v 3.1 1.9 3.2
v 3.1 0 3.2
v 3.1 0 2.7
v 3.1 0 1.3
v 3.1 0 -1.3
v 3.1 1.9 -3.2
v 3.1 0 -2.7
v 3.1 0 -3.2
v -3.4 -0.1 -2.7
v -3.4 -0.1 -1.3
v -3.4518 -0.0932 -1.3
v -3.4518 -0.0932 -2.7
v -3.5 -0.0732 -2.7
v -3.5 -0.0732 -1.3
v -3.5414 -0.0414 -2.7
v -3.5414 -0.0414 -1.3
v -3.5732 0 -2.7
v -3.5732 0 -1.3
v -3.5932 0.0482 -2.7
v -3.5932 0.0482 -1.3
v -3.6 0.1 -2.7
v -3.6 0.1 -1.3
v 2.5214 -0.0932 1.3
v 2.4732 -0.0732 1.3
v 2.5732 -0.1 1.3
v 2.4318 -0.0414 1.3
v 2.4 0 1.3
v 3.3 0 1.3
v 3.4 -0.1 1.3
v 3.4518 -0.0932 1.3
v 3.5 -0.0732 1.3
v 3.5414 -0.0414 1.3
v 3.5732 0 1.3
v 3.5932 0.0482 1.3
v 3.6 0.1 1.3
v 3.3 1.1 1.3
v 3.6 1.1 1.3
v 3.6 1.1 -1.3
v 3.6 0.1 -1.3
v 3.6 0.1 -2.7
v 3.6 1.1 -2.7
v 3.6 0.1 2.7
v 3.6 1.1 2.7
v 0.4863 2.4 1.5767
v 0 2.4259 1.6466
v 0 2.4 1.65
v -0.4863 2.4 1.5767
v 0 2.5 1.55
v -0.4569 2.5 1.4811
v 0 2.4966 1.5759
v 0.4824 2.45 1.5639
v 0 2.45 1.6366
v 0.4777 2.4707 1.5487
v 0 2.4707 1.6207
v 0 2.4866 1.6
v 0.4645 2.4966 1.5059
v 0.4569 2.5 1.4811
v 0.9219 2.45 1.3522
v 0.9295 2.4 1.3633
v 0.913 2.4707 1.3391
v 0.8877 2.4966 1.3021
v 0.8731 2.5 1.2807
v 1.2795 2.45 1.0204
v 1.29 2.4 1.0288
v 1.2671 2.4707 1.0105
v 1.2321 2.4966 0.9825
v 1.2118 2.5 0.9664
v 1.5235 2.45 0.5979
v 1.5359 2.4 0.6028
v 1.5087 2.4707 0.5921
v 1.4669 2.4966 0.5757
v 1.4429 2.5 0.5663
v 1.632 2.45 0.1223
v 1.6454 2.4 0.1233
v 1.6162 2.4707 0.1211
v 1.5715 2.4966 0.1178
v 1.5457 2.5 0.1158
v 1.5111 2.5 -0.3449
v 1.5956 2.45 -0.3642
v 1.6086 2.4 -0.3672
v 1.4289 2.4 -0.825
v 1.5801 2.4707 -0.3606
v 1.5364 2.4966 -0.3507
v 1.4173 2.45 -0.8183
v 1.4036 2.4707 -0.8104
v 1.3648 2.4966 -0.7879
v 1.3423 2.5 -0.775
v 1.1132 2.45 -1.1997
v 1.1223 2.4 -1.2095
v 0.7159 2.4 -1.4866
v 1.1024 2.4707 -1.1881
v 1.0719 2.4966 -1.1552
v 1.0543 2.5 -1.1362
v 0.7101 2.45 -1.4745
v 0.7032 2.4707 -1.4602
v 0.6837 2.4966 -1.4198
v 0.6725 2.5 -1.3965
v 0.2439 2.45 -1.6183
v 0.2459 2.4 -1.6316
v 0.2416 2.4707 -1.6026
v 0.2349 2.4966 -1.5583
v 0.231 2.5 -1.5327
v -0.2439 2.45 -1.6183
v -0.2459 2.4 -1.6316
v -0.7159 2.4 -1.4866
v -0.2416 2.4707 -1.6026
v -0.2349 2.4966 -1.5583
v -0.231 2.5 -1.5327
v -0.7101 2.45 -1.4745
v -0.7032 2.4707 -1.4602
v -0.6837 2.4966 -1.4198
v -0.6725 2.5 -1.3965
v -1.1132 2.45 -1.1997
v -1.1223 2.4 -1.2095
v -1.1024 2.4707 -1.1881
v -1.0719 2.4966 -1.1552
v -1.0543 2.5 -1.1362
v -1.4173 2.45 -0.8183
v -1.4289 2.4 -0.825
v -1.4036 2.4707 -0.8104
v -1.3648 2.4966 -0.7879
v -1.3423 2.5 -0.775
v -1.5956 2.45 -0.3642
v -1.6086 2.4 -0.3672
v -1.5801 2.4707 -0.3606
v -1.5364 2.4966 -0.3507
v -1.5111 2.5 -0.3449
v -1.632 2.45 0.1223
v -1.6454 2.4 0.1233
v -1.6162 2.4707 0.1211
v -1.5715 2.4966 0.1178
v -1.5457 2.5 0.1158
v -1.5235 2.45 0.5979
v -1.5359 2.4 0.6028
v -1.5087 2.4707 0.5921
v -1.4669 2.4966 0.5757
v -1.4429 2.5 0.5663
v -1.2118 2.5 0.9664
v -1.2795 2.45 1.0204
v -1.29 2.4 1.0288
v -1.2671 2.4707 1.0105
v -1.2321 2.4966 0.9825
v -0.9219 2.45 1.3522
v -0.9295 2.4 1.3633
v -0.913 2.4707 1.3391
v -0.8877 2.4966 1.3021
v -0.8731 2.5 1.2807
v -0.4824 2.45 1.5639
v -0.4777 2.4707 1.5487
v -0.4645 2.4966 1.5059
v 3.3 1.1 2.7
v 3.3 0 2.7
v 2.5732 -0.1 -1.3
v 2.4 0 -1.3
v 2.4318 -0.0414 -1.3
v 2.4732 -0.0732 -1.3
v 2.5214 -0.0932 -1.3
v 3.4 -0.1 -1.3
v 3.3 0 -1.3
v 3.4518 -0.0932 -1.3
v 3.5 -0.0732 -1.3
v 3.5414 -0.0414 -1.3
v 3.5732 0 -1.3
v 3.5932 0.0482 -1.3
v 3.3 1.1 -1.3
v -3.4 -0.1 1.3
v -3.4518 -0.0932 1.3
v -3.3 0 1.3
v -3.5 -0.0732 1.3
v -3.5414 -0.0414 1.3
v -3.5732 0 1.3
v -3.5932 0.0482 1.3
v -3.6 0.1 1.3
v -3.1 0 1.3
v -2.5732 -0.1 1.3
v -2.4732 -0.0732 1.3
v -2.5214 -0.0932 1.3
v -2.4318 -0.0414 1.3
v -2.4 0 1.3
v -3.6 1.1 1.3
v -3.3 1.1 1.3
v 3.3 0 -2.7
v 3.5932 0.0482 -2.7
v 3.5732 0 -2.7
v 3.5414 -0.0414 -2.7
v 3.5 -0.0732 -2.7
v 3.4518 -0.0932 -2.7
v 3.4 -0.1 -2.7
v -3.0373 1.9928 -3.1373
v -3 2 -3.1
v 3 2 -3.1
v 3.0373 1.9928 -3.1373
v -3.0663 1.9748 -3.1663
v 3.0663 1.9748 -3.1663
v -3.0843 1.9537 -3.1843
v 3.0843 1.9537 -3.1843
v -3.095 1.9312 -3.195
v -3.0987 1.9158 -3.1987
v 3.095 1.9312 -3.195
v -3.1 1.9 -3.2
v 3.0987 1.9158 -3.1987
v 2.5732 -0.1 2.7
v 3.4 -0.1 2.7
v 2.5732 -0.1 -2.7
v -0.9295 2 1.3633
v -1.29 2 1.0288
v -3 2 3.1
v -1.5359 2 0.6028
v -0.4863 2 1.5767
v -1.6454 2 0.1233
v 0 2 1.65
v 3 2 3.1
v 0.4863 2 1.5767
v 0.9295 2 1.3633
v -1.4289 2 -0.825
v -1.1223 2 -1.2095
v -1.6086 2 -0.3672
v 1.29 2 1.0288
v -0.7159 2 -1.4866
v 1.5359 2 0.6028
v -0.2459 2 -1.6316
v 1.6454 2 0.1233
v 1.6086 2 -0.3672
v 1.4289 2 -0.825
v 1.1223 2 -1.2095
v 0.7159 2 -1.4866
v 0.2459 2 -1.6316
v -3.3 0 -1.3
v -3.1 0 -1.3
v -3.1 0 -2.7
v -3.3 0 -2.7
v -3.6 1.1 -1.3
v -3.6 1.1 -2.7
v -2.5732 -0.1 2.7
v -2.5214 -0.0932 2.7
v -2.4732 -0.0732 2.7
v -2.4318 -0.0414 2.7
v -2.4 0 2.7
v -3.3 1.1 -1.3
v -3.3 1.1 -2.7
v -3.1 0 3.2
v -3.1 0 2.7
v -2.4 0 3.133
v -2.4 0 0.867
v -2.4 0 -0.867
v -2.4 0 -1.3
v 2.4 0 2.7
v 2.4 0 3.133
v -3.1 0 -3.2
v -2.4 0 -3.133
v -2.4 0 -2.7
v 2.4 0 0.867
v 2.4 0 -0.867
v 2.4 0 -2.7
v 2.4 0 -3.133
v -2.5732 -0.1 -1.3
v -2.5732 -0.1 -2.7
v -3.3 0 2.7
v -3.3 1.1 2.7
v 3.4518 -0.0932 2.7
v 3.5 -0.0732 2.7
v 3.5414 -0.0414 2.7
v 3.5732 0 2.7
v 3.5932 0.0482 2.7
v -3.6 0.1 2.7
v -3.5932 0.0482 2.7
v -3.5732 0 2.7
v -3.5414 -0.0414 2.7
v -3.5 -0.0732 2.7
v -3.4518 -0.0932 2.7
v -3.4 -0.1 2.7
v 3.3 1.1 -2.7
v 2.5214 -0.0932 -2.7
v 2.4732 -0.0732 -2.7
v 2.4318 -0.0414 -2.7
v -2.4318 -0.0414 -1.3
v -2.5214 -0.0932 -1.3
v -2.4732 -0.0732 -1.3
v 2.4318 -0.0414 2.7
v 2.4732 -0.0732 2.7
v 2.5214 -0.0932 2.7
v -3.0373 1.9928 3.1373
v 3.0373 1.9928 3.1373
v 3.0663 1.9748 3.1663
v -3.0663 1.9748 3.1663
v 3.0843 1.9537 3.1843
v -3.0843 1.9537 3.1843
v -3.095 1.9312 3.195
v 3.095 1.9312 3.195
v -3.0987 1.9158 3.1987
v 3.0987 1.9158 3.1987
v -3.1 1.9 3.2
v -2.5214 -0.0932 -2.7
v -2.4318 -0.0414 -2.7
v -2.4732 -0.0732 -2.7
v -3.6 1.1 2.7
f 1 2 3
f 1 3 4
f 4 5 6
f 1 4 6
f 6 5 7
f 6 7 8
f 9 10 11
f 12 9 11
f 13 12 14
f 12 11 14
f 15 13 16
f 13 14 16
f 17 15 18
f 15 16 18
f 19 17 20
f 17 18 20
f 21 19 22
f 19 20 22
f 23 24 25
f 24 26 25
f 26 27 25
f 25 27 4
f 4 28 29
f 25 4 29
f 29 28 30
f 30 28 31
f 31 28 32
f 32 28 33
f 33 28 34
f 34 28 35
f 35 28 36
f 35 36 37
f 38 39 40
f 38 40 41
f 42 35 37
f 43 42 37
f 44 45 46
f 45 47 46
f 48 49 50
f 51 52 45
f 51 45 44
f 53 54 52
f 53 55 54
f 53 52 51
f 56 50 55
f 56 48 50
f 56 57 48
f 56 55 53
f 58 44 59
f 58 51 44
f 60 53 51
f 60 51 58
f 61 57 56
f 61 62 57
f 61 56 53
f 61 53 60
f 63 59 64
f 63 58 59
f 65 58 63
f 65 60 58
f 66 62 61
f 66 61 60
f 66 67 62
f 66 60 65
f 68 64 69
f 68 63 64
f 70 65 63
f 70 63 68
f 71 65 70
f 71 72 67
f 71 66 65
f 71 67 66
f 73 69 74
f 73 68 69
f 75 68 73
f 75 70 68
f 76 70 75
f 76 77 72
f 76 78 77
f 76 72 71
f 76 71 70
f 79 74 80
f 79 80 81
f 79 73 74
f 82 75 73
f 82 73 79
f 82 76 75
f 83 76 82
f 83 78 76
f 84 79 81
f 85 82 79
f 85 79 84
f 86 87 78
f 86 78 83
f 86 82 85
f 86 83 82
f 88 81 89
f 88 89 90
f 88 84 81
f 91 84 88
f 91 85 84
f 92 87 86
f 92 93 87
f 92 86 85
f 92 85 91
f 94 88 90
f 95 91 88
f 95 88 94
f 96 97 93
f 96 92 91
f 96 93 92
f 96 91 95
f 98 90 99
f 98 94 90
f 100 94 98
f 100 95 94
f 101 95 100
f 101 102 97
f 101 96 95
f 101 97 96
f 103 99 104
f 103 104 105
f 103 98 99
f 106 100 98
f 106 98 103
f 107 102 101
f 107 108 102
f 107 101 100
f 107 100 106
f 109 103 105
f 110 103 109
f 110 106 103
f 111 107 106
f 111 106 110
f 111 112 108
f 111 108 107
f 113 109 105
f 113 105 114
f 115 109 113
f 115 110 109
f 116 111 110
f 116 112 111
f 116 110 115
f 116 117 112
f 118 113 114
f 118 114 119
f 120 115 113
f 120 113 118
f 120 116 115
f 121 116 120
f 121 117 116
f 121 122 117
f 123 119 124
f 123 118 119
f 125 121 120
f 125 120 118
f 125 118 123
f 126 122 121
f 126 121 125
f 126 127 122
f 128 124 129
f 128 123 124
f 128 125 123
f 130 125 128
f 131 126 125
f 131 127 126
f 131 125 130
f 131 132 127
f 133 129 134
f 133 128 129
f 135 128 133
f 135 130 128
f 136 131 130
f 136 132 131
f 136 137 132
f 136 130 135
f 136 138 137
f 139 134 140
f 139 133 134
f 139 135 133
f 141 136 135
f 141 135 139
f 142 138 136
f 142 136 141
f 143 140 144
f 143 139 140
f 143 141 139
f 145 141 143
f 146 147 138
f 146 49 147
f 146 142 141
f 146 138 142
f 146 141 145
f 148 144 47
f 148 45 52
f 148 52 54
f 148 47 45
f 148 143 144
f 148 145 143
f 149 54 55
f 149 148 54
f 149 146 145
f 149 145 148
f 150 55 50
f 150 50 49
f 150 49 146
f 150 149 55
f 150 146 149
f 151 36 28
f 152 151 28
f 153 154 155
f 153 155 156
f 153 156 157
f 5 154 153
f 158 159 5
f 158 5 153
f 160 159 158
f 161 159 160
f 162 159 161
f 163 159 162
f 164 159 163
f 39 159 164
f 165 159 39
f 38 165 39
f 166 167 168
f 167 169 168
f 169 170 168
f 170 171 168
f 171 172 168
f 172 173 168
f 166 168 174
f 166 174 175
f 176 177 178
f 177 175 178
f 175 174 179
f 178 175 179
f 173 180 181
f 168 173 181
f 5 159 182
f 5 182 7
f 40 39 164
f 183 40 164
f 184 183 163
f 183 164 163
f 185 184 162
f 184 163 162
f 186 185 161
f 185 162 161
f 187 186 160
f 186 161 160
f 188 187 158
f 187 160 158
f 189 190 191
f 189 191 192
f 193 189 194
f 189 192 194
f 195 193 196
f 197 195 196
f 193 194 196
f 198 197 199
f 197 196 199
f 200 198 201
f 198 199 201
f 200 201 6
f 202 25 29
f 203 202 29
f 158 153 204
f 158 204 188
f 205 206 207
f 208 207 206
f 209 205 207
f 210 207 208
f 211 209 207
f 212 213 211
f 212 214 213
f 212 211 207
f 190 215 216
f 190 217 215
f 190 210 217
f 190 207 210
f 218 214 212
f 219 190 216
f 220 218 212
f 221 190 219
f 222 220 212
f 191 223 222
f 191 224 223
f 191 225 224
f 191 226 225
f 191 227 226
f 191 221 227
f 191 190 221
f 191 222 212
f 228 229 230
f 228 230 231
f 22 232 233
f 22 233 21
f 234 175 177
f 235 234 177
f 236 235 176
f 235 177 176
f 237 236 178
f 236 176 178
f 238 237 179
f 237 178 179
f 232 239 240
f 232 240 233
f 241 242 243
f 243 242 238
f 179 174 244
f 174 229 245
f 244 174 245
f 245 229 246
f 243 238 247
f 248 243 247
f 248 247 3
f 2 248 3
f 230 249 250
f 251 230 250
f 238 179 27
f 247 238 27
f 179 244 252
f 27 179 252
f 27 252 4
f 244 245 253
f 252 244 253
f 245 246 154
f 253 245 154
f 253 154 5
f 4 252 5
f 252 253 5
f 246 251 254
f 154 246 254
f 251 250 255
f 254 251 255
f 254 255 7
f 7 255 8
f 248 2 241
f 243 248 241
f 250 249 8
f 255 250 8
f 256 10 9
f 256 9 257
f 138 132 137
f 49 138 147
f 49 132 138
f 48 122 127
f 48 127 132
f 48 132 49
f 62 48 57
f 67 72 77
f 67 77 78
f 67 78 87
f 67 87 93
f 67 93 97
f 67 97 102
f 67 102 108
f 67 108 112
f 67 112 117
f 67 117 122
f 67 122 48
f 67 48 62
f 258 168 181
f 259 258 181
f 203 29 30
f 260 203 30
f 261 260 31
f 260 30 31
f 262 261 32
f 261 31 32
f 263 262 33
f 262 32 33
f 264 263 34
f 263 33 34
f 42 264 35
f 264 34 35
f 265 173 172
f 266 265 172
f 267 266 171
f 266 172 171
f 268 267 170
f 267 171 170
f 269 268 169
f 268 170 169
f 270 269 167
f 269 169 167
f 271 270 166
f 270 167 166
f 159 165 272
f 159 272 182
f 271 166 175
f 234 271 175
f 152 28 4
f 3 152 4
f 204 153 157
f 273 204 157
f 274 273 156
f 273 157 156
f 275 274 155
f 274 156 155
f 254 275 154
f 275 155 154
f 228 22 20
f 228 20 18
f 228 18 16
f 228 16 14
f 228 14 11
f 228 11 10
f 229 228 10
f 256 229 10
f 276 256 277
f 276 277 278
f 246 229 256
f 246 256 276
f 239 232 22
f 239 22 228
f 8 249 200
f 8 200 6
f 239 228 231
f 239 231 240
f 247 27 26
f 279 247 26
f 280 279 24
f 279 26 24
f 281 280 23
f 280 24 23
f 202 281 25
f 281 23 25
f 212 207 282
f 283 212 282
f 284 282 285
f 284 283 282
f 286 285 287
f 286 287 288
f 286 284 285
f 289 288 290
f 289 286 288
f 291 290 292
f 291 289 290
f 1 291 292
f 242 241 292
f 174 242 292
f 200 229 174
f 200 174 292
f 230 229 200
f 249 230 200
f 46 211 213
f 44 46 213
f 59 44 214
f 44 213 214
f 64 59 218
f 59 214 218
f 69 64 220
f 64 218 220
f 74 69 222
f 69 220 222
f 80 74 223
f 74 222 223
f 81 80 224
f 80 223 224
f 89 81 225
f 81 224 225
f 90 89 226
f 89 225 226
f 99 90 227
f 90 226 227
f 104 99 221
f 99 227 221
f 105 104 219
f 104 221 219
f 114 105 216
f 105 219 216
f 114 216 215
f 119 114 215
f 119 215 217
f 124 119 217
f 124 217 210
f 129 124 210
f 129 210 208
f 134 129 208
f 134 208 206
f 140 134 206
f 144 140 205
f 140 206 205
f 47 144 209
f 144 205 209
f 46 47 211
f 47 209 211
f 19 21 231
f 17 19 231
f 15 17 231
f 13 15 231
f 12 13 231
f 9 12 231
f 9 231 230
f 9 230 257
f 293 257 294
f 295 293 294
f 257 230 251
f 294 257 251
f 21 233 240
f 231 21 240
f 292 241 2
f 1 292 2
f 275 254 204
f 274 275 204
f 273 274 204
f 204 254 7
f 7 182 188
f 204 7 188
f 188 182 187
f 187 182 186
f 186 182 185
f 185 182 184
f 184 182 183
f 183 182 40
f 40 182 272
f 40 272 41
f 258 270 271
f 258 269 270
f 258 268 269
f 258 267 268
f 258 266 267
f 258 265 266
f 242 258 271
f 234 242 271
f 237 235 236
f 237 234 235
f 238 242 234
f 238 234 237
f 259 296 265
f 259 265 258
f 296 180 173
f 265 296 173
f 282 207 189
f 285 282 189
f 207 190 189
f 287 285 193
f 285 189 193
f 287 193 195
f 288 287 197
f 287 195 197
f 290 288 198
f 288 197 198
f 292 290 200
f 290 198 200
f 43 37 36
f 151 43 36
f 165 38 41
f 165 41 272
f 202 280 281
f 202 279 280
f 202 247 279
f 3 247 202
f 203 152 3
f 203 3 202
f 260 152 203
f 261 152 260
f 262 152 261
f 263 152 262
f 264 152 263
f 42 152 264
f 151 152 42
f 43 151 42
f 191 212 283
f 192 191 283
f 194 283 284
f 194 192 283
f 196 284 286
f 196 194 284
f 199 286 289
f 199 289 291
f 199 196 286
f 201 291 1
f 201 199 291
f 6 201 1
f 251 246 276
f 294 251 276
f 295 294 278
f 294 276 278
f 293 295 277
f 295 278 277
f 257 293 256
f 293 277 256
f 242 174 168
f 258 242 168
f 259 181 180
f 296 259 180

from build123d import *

# Parameters (mm, degrees)
ESQUISSE1_W           = 6.2
ESQUISSE1_H           = 6.4
BOSS_EXTRU_1_DEPTH    = 2
ESQUISSE2_R           = 1.65
BOSS_EXTRU_2_DEPTH    = 0.5
BOSS_EXTRU_4_START    = 1.3
BOSS_EXTRU_4_DEPTH    = 1.4
CONG_2_R              = 0.2
CONG_2_OF_SYM_TRIE2_R = 0.2
CONG_3_R              = 0.1
CONG_4_R              = 0.1


with BuildPart() as part:
    # Esquisse1 → Boss.-Extru.1 (new body)
    with BuildSketch(Plane(origin=(0, 0, 0), x_dir=(1, 0, 0), z_dir=(0, 1, 0))):
        Rectangle(ESQUISSE1_W, ESQUISSE1_H)
    extrude(amount=BOSS_EXTRU_1_DEPTH)

    # Esquisse2 → Boss.-Extru.2 (add)
    with BuildSketch(Plane(origin=(0, 2, 0), x_dir=(1, 0, 0), z_dir=(0, 1, 0))):
        with Locations(Location((0, 0, 0), (0, 0, 270))):
            Circle(ESQUISSE2_R)
    extrude(amount=BOSS_EXTRU_2_DEPTH)

    # Esquisse4 → Boss.-Extru.4 (add)
    with BuildSketch(Plane.XY.offset(BOSS_EXTRU_4_START)):
        Polygon((3.1, 0), (2.4, 0), (2.4, -0.1), (3.6, -0.1), (3.6, 1.1), (3.3, 1.1), (3.3, 0), align=None)
        Polygon((-2.4, -0.1), (-2.4, 0), (-3.3, 0), (-3.3, 1.1), (-3.6, 1.1), (-3.6, -0.1), align=None)
    boss_extru_4 = extrude(amount=BOSS_EXTRU_4_DEPTH)

    # Congé2
    # the kernel refuses this fillet: 0.2 mm, written as the material it takes off along each edge
    with BuildSketch(Plane(origin=(-2.4, -0.1, 0.866987298), x_dir=(0, 1, 0), z_dir=(0, 0, 1))) as cong_2_piece_1:
        with BuildLine():
            CenterArc((0.2, 0.173205081), CONG_2_R, 180, 60)
            Line((0, 0.173205081), (-0.004, 0.173205081))
            Line((-0.004, 0.173205081), (-0.004, 0))
            Line((-0.004, 0), (0, -0.004))
            ThreePointArc((0, -0.004), (0.05, -0.004), (0.098, -0.003464102))
            Line((0.098, -0.003464102), (0.1, 0))
        make_face()
    extrude(amount=2.266025404, mode=Mode.SUBTRACT)
    with BuildSketch(Plane(origin=(2.4, -0.1, 0.866987298), x_dir=(0, 1, 0), z_dir=(0, 0, 1))) as cong_2_piece_2:
        with BuildLine():
            CenterArc((0.2, -0.173205081), CONG_2_R, 120, 60)
            Line((0, -0.173205081), (-0.004, -0.173205081))
            Line((-0.004, -0.173205081), (-0.004, 0))
            Line((-0.004, 0), (0, 0.004))
            ThreePointArc((0, 0.004), (0.05, 0.004), (0.098, 0.003464102))
            Line((0.098, 0.003464102), (0.1, 0))
        make_face()
    extrude(amount=2.266025404, mode=Mode.SUBTRACT)
    with BuildSketch(Plane(origin=(3.6, -0.1, 0.8), x_dir=(0, 1, 0), z_dir=(0, 0, 1))) as cong_2_piece_3:
        with BuildLine():
            CenterArc((CONG_2_R, CONG_2_R), CONG_2_R, 180, 90)
            Line((0, CONG_2_R), (-CONG_2_R * 0.02, CONG_2_R))
            Line((-CONG_2_R * 0.02, CONG_2_R), (-CONG_2_R * 0.02, -CONG_2_R * 0.02))
            Line((-CONG_2_R * 0.02, -CONG_2_R * 0.02), (CONG_2_R, -CONG_2_R * 0.02))
            Line((CONG_2_R, -CONG_2_R * 0.02), (CONG_2_R, 0))
        make_face()
    extrude(amount=2.4, mode=Mode.SUBTRACT)
    with BuildSketch(Plane(origin=(-3.6, -0.1, 0.8), x_dir=(0, 1, 0), z_dir=(0, 0, 1))) as cong_2_piece_4:
        with BuildLine():
            CenterArc((CONG_2_R, -CONG_2_R), CONG_2_R, 90, 90)
            Line((0, -CONG_2_R), (-CONG_2_R * 0.02, -CONG_2_R))
            Line((-CONG_2_R * 0.02, -CONG_2_R), (-CONG_2_R * 0.02, CONG_2_R * 0.02))
            Line((-CONG_2_R * 0.02, CONG_2_R * 0.02), (CONG_2_R, CONG_2_R * 0.02))
            Line((CONG_2_R, CONG_2_R * 0.02), (CONG_2_R, 0))
        make_face()
    extrude(amount=2.4, mode=Mode.SUBTRACT)

    # Symétrie2: Boss.-Extru.4 across plane
    add(boss_extru_4.mirror(Plane.XY))

    # Congé2 of Symétrie2
    # the kernel refuses this fillet: 0.2 mm, written as the material it takes off along each edge
    with BuildSketch(Plane(origin=(-2.4, -0.1, -0.866987298), x_dir=(0, 1, 0), z_dir=(0, 0, -1))) as cong_2_of_sym_trie2_piece_1:
        with BuildLine():
            CenterArc((0.2, -0.173205081), CONG_2_OF_SYM_TRIE2_R, 120, 60)
            Line((0, -0.173205081), (-0.004, -0.173205081))
            Line((-0.004, -0.173205081), (-0.004, 0))
            Line((-0.004, 0), (0, 0.004))
            ThreePointArc((0, 0.004), (0.05, 0.004), (0.098, 0.003464102))
            Line((0.098, 0.003464102), (0.1, 0))
        make_face()
    extrude(amount=2.266025404, mode=Mode.SUBTRACT)
    with BuildSketch(Plane(origin=(2.4, -0.1, -0.866987298), x_dir=(0, 1, 0), z_dir=(0, 0, -1))) as cong_2_of_sym_trie2_piece_2:
        with BuildLine():
            CenterArc((0.2, 0.173205081), CONG_2_OF_SYM_TRIE2_R, 180, 60)
            Line((0, 0.173205081), (-0.004, 0.173205081))
            Line((-0.004, 0.173205081), (-0.004, 0))
            Line((-0.004, 0), (0, -0.004))
            ThreePointArc((0, -0.004), (0.05, -0.004), (0.098, -0.003464102))
            Line((0.098, -0.003464102), (0.1, 0))
        make_face()
    extrude(amount=2.266025404, mode=Mode.SUBTRACT)
    with BuildSketch(Plane(origin=(3.6, -0.1, -0.8), x_dir=(0, 1, 0), z_dir=(0, 0, -1))) as cong_2_of_sym_trie2_piece_3:
        with BuildLine():
            CenterArc((CONG_2_OF_SYM_TRIE2_R, -CONG_2_OF_SYM_TRIE2_R), CONG_2_OF_SYM_TRIE2_R, 90, 90)
            Line((0, -CONG_2_OF_SYM_TRIE2_R), (-CONG_2_OF_SYM_TRIE2_R * 0.02, -CONG_2_OF_SYM_TRIE2_R))
            Line((-CONG_2_OF_SYM_TRIE2_R * 0.02, -CONG_2_OF_SYM_TRIE2_R), (-CONG_2_OF_SYM_TRIE2_R * 0.02, CONG_2_OF_SYM_TRIE2_R * 0.02))
            Line((-CONG_2_OF_SYM_TRIE2_R * 0.02, CONG_2_OF_SYM_TRIE2_R * 0.02), (CONG_2_OF_SYM_TRIE2_R, CONG_2_OF_SYM_TRIE2_R * 0.02))
            Line((CONG_2_OF_SYM_TRIE2_R, CONG_2_OF_SYM_TRIE2_R * 0.02), (CONG_2_OF_SYM_TRIE2_R, 0))
        make_face()
    extrude(amount=2.4, mode=Mode.SUBTRACT)
    with BuildSketch(Plane(origin=(-3.6, -0.1, -0.8), x_dir=(0, 1, 0), z_dir=(0, 0, -1))) as cong_2_of_sym_trie2_piece_4:
        with BuildLine():
            CenterArc((CONG_2_OF_SYM_TRIE2_R, CONG_2_OF_SYM_TRIE2_R), CONG_2_OF_SYM_TRIE2_R, 180, 90)
            Line((0, CONG_2_OF_SYM_TRIE2_R), (-CONG_2_OF_SYM_TRIE2_R * 0.02, CONG_2_OF_SYM_TRIE2_R))
            Line((-CONG_2_OF_SYM_TRIE2_R * 0.02, CONG_2_OF_SYM_TRIE2_R), (-CONG_2_OF_SYM_TRIE2_R * 0.02, -CONG_2_OF_SYM_TRIE2_R * 0.02))
            Line((-CONG_2_OF_SYM_TRIE2_R * 0.02, -CONG_2_OF_SYM_TRIE2_R * 0.02), (CONG_2_OF_SYM_TRIE2_R, -CONG_2_OF_SYM_TRIE2_R * 0.02))
            Line((CONG_2_OF_SYM_TRIE2_R, -CONG_2_OF_SYM_TRIE2_R * 0.02), (CONG_2_OF_SYM_TRIE2_R, 0))
        make_face()
    extrude(amount=2.4, mode=Mode.SUBTRACT)

    # Congé3
    cong_3_edges = [part.edges().sort_by_distance(p)[0] for p in [
        (0, 2.5, -1.65),
    ]]
    fillet(cong_3_edges, radius=CONG_3_R)

    # Congé4
    cong_4_edges = [part.edges().sort_by_distance(p)[0] for p in [
        (3.1, 2, 0),
        (0, 2, -3.2),
        (-3.1, 2, 0),
        (0, 2, 3.2),
    ]]
    fillet(cong_4_edges, radius=CONG_4_R)


solid = part.part
